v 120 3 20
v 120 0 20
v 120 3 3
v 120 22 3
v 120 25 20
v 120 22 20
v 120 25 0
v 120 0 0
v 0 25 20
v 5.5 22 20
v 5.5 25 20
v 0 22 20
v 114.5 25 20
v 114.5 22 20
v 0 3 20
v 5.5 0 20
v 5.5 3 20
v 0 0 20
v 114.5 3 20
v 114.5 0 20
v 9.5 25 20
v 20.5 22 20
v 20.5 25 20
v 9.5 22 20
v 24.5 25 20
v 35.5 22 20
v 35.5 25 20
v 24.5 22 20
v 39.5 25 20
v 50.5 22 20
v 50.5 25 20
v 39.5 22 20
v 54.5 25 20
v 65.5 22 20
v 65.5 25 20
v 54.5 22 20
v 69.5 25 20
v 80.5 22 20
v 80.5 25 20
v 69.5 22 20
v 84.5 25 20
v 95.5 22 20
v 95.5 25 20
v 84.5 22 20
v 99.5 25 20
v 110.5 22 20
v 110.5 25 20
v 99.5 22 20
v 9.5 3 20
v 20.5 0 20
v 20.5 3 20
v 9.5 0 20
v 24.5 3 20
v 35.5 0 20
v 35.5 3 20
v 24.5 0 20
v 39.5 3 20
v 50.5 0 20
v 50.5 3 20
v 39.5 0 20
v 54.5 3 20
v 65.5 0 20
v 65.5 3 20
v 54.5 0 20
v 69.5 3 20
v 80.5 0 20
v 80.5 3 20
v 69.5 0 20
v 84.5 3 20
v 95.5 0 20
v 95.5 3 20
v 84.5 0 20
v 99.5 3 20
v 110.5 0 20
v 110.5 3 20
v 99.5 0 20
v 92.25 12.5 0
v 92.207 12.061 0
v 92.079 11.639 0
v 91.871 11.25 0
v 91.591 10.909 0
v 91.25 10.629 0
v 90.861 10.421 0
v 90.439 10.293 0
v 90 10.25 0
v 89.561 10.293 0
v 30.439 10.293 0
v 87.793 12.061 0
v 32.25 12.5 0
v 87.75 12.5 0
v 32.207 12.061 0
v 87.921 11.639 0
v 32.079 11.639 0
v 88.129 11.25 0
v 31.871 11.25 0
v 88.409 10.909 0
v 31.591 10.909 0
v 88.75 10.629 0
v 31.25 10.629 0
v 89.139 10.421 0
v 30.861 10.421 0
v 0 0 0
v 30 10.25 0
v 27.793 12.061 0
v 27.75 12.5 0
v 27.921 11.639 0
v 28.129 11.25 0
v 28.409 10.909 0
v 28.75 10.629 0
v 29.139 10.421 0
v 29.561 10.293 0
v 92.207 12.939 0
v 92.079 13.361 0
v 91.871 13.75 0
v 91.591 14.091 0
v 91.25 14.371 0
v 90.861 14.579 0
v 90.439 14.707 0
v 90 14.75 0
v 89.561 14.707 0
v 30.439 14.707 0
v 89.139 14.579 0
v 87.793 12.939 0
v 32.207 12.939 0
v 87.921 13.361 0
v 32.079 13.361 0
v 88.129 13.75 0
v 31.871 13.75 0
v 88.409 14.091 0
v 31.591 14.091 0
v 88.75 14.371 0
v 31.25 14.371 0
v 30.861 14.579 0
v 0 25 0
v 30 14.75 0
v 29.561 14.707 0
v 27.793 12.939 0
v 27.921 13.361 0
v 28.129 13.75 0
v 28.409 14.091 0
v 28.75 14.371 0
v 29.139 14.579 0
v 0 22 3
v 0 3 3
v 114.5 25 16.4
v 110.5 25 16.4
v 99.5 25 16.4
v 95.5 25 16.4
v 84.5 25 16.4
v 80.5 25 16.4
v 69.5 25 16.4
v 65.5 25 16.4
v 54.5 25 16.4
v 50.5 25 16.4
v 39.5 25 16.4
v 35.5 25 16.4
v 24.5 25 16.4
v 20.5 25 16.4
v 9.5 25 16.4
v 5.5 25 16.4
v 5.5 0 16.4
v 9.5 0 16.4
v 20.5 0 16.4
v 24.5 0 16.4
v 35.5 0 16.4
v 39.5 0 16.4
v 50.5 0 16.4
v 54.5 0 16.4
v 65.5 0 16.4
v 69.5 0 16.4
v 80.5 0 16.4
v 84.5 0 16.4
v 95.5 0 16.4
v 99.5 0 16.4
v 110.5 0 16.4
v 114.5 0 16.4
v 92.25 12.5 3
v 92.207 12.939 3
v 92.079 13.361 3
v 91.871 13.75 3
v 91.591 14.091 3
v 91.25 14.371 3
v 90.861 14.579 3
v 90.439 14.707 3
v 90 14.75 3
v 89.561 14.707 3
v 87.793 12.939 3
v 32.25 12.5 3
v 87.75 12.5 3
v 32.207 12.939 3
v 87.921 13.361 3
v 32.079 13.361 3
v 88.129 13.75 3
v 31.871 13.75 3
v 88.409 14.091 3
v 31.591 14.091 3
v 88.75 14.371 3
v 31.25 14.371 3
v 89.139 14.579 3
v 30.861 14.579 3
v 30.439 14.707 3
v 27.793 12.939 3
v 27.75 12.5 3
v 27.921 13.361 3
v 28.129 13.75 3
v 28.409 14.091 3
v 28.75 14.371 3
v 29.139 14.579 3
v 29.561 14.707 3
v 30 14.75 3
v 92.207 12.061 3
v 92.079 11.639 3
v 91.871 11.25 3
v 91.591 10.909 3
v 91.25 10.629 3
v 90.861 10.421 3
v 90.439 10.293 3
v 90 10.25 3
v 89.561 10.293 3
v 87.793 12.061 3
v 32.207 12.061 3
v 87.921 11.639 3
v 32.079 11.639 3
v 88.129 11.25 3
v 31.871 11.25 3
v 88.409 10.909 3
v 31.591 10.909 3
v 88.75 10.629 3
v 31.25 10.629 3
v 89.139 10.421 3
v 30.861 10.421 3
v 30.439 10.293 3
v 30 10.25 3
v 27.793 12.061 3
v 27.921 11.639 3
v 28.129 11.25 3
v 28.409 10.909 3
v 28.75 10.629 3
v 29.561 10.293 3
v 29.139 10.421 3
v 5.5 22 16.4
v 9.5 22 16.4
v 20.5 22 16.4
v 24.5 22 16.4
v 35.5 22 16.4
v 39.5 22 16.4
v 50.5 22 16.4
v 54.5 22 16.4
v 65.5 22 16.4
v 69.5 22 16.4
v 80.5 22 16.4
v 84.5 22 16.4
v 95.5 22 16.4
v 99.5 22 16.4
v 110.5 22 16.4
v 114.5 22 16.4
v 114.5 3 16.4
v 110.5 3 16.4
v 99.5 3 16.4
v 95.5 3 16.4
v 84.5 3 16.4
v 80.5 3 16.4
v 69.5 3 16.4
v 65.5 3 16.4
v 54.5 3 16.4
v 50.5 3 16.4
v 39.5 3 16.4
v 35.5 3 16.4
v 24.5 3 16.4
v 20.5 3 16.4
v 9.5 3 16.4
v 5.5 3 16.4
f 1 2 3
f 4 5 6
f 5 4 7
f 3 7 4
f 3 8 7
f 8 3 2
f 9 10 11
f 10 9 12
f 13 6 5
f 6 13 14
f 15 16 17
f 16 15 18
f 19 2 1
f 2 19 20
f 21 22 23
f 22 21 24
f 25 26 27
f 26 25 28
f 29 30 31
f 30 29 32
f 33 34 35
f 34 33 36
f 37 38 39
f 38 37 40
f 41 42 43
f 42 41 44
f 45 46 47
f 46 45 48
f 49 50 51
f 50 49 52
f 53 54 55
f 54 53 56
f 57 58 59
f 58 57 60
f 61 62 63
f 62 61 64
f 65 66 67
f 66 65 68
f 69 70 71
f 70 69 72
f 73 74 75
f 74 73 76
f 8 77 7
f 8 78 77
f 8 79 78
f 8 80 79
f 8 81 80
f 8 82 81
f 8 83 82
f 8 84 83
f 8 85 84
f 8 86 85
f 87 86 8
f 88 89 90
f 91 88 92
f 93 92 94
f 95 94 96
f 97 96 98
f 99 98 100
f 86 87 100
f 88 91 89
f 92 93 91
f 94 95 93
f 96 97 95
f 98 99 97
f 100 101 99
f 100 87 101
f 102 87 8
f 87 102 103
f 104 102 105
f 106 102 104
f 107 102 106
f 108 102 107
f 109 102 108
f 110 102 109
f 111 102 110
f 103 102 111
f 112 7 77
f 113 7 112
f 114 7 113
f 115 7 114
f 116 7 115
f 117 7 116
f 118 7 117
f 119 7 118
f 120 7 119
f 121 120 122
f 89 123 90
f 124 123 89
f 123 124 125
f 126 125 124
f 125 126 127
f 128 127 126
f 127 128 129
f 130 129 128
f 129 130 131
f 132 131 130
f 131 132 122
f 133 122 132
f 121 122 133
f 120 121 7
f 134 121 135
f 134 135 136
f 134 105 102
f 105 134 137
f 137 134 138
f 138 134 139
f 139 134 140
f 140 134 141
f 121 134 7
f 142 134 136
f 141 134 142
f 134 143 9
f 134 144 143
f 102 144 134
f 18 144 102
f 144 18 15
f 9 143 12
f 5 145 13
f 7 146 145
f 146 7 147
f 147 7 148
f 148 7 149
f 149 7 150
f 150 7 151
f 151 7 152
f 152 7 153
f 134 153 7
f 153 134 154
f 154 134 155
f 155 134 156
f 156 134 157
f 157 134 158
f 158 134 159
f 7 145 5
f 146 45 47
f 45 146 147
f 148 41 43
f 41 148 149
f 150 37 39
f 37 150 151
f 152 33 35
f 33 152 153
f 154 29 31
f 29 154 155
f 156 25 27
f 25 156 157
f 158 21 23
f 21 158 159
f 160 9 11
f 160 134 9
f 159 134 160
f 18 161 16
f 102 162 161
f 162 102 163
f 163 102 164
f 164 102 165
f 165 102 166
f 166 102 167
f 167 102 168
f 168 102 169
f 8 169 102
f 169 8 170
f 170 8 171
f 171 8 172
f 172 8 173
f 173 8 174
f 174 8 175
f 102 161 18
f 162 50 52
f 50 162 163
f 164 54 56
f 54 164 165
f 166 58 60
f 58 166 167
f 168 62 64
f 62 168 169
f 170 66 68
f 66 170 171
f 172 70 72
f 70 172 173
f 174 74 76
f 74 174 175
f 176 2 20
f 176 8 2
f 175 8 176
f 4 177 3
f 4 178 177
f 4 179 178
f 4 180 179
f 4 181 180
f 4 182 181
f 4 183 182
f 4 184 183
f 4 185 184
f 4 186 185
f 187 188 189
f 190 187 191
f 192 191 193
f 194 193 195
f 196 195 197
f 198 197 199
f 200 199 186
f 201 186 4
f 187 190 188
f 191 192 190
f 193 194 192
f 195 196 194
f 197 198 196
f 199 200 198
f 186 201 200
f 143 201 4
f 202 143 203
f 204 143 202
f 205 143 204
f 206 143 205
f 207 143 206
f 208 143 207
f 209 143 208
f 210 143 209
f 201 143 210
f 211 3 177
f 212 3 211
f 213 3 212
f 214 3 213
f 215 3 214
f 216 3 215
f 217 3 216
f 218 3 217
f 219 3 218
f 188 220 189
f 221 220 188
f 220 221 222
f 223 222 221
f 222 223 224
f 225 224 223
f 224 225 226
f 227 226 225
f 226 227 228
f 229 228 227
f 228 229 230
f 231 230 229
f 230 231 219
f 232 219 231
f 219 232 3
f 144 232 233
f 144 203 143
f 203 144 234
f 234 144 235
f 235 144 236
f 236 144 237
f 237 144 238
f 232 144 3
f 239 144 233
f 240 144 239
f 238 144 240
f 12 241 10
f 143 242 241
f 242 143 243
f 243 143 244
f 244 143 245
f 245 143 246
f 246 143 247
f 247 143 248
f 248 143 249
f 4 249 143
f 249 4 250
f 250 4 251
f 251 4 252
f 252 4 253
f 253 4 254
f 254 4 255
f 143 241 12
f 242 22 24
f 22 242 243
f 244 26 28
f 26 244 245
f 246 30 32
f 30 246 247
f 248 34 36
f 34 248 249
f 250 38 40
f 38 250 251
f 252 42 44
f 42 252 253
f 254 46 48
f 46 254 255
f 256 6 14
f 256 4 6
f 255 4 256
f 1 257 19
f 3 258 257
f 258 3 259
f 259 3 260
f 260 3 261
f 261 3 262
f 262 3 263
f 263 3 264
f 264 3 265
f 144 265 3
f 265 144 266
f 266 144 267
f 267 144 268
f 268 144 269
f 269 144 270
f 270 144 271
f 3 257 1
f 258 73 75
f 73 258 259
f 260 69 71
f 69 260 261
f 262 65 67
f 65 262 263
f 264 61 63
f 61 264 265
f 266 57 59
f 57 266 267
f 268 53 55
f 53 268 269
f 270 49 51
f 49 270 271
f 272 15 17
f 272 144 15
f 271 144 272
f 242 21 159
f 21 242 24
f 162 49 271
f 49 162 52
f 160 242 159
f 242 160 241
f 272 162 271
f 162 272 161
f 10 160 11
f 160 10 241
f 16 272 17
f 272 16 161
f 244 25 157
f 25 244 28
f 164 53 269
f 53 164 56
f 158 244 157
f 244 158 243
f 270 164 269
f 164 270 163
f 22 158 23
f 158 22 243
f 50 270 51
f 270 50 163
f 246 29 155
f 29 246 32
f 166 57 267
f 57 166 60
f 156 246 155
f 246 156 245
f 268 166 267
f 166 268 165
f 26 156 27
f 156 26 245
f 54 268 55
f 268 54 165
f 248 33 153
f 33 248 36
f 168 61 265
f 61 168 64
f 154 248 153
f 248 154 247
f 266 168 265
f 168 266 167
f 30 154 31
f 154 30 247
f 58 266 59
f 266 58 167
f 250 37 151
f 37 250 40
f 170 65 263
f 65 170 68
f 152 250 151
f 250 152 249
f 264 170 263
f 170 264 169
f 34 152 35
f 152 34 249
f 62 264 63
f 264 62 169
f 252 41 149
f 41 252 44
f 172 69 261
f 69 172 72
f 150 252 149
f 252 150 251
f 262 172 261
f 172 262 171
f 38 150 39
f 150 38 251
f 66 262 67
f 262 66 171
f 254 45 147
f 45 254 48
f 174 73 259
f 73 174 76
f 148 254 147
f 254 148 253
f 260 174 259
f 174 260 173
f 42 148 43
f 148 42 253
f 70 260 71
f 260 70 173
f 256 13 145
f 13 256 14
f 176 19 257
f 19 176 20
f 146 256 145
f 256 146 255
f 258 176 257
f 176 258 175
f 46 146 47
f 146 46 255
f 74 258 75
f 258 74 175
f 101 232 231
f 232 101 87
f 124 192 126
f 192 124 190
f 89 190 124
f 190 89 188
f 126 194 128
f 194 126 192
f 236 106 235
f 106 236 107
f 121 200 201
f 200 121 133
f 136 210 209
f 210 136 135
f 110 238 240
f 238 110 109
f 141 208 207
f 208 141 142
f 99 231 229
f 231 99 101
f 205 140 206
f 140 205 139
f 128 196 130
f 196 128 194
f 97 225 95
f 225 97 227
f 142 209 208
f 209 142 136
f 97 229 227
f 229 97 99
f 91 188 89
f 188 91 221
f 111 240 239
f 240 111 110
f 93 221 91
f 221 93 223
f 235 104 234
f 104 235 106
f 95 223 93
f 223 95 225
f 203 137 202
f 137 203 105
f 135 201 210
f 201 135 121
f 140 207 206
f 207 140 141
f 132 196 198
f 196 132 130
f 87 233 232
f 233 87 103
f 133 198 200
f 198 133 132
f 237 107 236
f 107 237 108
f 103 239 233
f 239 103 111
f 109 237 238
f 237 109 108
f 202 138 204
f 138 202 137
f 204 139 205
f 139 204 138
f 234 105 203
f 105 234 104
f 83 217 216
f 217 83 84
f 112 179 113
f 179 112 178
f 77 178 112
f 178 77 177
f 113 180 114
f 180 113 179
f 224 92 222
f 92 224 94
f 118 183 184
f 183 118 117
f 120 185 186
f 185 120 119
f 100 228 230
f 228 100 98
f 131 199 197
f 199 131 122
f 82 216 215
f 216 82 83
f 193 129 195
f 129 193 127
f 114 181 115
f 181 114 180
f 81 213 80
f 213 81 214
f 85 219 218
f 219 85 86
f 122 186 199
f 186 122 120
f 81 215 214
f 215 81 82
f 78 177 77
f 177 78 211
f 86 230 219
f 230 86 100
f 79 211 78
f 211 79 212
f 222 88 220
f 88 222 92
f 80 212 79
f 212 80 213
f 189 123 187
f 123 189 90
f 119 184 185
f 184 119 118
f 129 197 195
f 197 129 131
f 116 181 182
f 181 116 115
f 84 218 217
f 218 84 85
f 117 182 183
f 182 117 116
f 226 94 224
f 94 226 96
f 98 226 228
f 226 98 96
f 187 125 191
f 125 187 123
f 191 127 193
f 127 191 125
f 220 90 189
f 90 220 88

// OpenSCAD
$fn = 32;

// ----------------------------------------------------------------------
// Cable duct: 120 x 25 x 20 mm, 8 fingers
// ----------------------------------------------------------------------

// --- parameters (mm) ---
tray_len = 120;           // duct length, X
tray_w = 25;              // duct width, Y
tray_h = 20;              // duct height, Z
tray_t = 3;               // side wall thickness
floor_t = 3;              // floor thickness
slot_w = 4;               // finger slot width
slot_h = 13.4;            // finger slot height
fingers = 8;              // number of finger slots per side
pitch = 15;               // finger pitch
hole_d = 4.5;             // floor mounting hole
hole_n = 2;               // mounting holes in the floor

module shell() {
  difference() {
    cube([tray_len, tray_w, tray_h]);
    /* open top channel */
    translate([-tray_t - 1, tray_t, floor_t])
      cube([tray_len + 2 * tray_t + 2, tray_w - 2 * tray_t, tray_h + 1]);
  }
}

difference() {
  union() {
    shell();
  }
  /* finger slots cut through both side walls */
  for (i = [0 : fingers - 1]) translate([pitch / 2 + i * pitch - slot_w / 2, -1, floor_t + slot_h]) cube([slot_w, tray_w + 2, tray_h]);
  for (i = [0 : hole_n - 1]) translate([(tray_len / hole_n) * (i + 0.5), tray_w / 2, -1]) cylinder(h = floor_t + 2, d = hole_d);
}
